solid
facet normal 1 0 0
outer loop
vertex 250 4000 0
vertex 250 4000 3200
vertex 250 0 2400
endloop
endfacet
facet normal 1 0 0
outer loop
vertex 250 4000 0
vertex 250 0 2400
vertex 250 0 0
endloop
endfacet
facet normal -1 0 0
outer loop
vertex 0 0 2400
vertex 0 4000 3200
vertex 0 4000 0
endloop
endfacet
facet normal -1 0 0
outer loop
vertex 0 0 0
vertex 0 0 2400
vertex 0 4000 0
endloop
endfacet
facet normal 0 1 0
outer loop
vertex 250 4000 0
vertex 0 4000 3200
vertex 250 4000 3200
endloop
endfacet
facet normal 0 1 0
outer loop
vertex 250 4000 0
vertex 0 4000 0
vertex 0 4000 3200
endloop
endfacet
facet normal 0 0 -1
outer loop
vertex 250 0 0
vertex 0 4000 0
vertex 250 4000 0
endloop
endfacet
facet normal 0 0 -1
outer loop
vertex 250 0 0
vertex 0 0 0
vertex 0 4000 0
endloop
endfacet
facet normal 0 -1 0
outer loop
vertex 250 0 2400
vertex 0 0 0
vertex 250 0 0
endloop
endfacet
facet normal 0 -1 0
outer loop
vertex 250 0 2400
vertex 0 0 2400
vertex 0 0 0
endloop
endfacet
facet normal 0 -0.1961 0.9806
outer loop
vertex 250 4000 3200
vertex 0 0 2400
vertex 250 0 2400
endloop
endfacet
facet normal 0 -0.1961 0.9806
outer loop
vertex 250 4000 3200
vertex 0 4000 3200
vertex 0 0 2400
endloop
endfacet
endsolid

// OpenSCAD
// file: tea_shop_parameters.scad
// =============================================================================
// Tea Shop — SHARED PARAMETERS (Base & Shell)
// -----------------------------------------------------------------------------
// OpenSCAD's native unit is 1 mm, so every value here is the REAL-LIFE size
// in millimetres (1000 mm = 1 m). E.g. building_width = 6000 means 6.0 m.
//
// For MLO / FiveM (which uses metres as 1 unit = 1 m), either:
//   (a) export each STL here and re-import at a scale of 0.001 (mm -> m), or
//   (b) model in metres directly by dividing every value below by 1000.
//
// Tune each value here; every module pulls its size from these variables.
// =============================================================================


// --- building shell / roof (lean-to: TALL back, SHORT front eave) -----------
wall_thickness    = 250;   // wall panel thickness                      (0.25 m)
building_width    = 6000;  // X extent, left wall -> right wall          (6.00 m)
building_depth    = 4000;  // Y extent, front eave -> back wall          (4.00 m)
back_height       = 3200;  // full wall height at the BACK (tall side)   (3.20 m)
front_eave_height = 2400;  // wall height at the FRONT eave (short side) (2.40 m)

// --- front wall openings (service window + door), measured along X ----------
left_pier_width   = 600;   // solid pier left of the service window      (0.60 m)
window_width      = 3400;  // service window opening width — made WIDE   (3.40 m)
mid_pier_width    = 500;   // solid pier between window and door         (0.50 m)
door_width        = 1000;  // door opening width                         (1.00 m)
sill_height       = 900;   // knee-wall (sill) height beneath the window (0.90 m)

// --- base slab / plinth ------------------------------------------------------
base_thickness    = 200;   // vertical thickness of the ground plinth    (0.20 m)
base_side_margin  = 900;   // slab overhang beyond left/right walls      (0.90 m)
base_back_margin  = 600;   // slab overhang behind the back wall         (0.60 m)
base_front_margin = 3000;  // extra slab in FRONT = porch/patio (pergola)(3.00 m)


// -----------------------------------------------------------------------------
// DERIVED DIMENSIONS (do not edit — computed from the values above)
// -----------------------------------------------------------------------------

// front-wall pier chain, left -> right, must sum exactly to building_width
window_left      = left_pier_width;                    // X where the window starts
window_right     = window_left + window_width;         // X where the window ends
door_left        = window_right + mid_pier_width;      // X where the door starts
door_right       = door_left + door_width;             // X where the door ends
right_pier_width = building_width - door_right;        // fills the rest to the corner

// window opening rises from the top of the sill up to the front eave line
window_open_height = front_eave_height - sill_height;
// file: tea_shop_modules.scad
// =============================================================================
// Tea Shop — MODULE LIBRARY (Base & Shell)
// -----------------------------------------------------------------------------
// This file only DEFINES the parts (and the assemble() preview). It instantiates
// NO geometry on its own, so it can be include'd by the individual export files
// (part_*.scad) and by tea_shop_assemble.scad without producing duplicates.
//
// GLOBAL COORDINATE SYSTEM (shared by every piece — no per-part centering):
//   +X -> left -> right  (building WIDTH along X, left wall at X=0)
//   +Y -> front -> back  (building DEPTH along Y, front eave at Y=0)
//   +Z -> up             (ground/porch surface = Z=0)
//
//   Building footprint = [0..building_width] x [0..building_depth].
//   Roof = single-pitch lean-to: TALL at BACK (Y=depth), SHORT at FRONT (Y=0).
// =============================================================================

include <tea_shop_parameters.scad>;


// -----------------------------------------------------------------------------
// _trapezoid_prism — shared core for the two side walls. It draws the side
// elevation (depth x height) as a 2D polygon, then linear_extrude +
// rotate([0,-90,0]) stand it up so its thickness runs along X. The front edge
// (Y=0) is the short eave height and the back edge (Y=depth) is the full back
// height, so the top edge automatically matches the roof pitch. Result
// occupies X = [0 .. wall_thickness].
// -----------------------------------------------------------------------------
module _trapezoid_prism() {
    translate([wall_thickness, 0, 0])
        rotate([0, -90, 0])
            linear_extrude(height = wall_thickness)
                polygon(points = [
                    [0,                 0],               // front, ground
                    [0,                 building_depth],  // back,  ground
                    [back_height,       building_depth],  // back,  top (tall)
                    [front_eave_height, 0]                // front, top (eave)
                ]);
}


// =============================================================================
// base_slab — flat ground plinth. Extends past the building on all sides, with
// a generous margin up front to form the porch/patio where the bench / stools
// sit under the pergola. Top surface is the datum Z=0.
// =============================================================================
module base_slab() {
    translate([-base_side_margin, -base_front_margin, -base_thickness])
        cube([
            building_width + 2 * base_side_margin,                 // X
            building_depth + base_front_margin + base_back_margin, // Y
            base_thickness                                          // Z
        ]);
}


// =============================================================================
// back_wall — solid rectangular panel, full building width and FULL height
// (the tall side of the lean-to). Sits at the back edge of the footprint.
// =============================================================================
module back_wall() {
    translate([0, building_depth - wall_thickness, 0])
        cube([building_width, wall_thickness, back_height]);
}


// =============================================================================
// left_side_wall — trapezoidal panel, TALL at the back edge and SHORT at the
// front edge, matching the roof slope. Occupies X = [0 .. wall_thickness].
// =============================================================================
module left_side_wall() {
    _trapezoid_prism();
}


// =============================================================================
// right_side_wall — mirror image of the left wall (identical trapezoid cross
// section, since both walls slope down toward the FRONT eave), placed at the
// right edge X = [building_width - wall_thickness .. building_width].
// Plain — no openings.
// =============================================================================
module right_side_wall() {
    translate([building_width - wall_thickness, 0, 0])
        _trapezoid_prism();
}


// =============================================================================
// FRONT WALL — broken into solid piers + a knee-wall (sill), leaving a service
// window opening and a door opening. Every front piece tops out at the front
// eave height (the horizontal line where the roof meets the front wall).
//
//   |<- left ->|<--- window --->|<- mid ->|<-- door -->|<- right ->|
//   |   pier   |    (opening)   |   pier  |  (opening)  |   pier   |
//   |          |   [sill below] |         |             |          |
// =============================================================================

// front_wall_left_pier — solid pier left of the service window, ground to eave.
module front_wall_left_pier() {
    translate([0, 0, 0])
        cube([left_pier_width, wall_thickness, front_eave_height]);
}


// front_wall_sill — the low knee-wall beneath the service window opening.
// The window opening sits above it.
// TODO: counter + window frame modules slot in above this sill (later group).
module front_wall_sill() {
    translate([window_left, 0, 0])
        cube([window_width, wall_thickness, sill_height]);
}


// front_wall_mid_pier — solid pier between the window and the door, full height.
module front_wall_mid_pier() {
    translate([window_right, 0, 0])
        cube([mid_pier_width, wall_thickness, front_eave_height]);
}


// front_wall_right_pier — solid pier right of the door, out to the front corner.
// Width is derived so the pier chain always ends flush with the right corner.
module front_wall_right_pier() {
    translate([door_right, 0, 0])
        cube([right_pier_width, wall_thickness, front_eave_height]);
}


// -----------------------------------------------------------------------------
// OPENING ANNOTATIONS (for reference — these are EMPTY volumes in the shell):
//
//   Service window opening:
//     X = [window_left .. window_right], Z = [sill_height .. front_eave_height]
//     TODO: window frame + service counter modules slot in here (later group).
//
//   Door opening:
//     X = [door_left .. door_right], Z = [0 .. front_eave_height] (full height)
//     TODO: door / door-frame module slots in here (later group).
// -----------------------------------------------------------------------------


// =============================================================================
// assemble — visual verification ONLY (not for export). Shows every piece in
// the shared coordinate system, each in its own colour, so the assembled shell
// can be checked against the reference before exporting individual STLs.
// =============================================================================
module assemble() {
    color("LightGray")  base_slab();

    color("SkyBlue")    back_wall();
    color("Orange")     left_side_wall();
    color("Orange")     right_side_wall();

    color("FireBrick")  front_wall_left_pier();
    color("Peru")       front_wall_sill();
    color("FireBrick")  front_wall_mid_pier();
    color("FireBrick")  front_wall_right_pier();
}
// main file
// =============================================================================
// part_left_side_wall.scad — export the LEFT SIDE WALL only (trapezoid panel).
// Open this file, press F6 (render), then export as STL. Everything sits in the
// shared global coordinate system, so re-importing all parts together lines up
// automatically with no manual repositioning.
// =============================================================================

include <tea_shop_modules.scad>;

left_side_wall();
